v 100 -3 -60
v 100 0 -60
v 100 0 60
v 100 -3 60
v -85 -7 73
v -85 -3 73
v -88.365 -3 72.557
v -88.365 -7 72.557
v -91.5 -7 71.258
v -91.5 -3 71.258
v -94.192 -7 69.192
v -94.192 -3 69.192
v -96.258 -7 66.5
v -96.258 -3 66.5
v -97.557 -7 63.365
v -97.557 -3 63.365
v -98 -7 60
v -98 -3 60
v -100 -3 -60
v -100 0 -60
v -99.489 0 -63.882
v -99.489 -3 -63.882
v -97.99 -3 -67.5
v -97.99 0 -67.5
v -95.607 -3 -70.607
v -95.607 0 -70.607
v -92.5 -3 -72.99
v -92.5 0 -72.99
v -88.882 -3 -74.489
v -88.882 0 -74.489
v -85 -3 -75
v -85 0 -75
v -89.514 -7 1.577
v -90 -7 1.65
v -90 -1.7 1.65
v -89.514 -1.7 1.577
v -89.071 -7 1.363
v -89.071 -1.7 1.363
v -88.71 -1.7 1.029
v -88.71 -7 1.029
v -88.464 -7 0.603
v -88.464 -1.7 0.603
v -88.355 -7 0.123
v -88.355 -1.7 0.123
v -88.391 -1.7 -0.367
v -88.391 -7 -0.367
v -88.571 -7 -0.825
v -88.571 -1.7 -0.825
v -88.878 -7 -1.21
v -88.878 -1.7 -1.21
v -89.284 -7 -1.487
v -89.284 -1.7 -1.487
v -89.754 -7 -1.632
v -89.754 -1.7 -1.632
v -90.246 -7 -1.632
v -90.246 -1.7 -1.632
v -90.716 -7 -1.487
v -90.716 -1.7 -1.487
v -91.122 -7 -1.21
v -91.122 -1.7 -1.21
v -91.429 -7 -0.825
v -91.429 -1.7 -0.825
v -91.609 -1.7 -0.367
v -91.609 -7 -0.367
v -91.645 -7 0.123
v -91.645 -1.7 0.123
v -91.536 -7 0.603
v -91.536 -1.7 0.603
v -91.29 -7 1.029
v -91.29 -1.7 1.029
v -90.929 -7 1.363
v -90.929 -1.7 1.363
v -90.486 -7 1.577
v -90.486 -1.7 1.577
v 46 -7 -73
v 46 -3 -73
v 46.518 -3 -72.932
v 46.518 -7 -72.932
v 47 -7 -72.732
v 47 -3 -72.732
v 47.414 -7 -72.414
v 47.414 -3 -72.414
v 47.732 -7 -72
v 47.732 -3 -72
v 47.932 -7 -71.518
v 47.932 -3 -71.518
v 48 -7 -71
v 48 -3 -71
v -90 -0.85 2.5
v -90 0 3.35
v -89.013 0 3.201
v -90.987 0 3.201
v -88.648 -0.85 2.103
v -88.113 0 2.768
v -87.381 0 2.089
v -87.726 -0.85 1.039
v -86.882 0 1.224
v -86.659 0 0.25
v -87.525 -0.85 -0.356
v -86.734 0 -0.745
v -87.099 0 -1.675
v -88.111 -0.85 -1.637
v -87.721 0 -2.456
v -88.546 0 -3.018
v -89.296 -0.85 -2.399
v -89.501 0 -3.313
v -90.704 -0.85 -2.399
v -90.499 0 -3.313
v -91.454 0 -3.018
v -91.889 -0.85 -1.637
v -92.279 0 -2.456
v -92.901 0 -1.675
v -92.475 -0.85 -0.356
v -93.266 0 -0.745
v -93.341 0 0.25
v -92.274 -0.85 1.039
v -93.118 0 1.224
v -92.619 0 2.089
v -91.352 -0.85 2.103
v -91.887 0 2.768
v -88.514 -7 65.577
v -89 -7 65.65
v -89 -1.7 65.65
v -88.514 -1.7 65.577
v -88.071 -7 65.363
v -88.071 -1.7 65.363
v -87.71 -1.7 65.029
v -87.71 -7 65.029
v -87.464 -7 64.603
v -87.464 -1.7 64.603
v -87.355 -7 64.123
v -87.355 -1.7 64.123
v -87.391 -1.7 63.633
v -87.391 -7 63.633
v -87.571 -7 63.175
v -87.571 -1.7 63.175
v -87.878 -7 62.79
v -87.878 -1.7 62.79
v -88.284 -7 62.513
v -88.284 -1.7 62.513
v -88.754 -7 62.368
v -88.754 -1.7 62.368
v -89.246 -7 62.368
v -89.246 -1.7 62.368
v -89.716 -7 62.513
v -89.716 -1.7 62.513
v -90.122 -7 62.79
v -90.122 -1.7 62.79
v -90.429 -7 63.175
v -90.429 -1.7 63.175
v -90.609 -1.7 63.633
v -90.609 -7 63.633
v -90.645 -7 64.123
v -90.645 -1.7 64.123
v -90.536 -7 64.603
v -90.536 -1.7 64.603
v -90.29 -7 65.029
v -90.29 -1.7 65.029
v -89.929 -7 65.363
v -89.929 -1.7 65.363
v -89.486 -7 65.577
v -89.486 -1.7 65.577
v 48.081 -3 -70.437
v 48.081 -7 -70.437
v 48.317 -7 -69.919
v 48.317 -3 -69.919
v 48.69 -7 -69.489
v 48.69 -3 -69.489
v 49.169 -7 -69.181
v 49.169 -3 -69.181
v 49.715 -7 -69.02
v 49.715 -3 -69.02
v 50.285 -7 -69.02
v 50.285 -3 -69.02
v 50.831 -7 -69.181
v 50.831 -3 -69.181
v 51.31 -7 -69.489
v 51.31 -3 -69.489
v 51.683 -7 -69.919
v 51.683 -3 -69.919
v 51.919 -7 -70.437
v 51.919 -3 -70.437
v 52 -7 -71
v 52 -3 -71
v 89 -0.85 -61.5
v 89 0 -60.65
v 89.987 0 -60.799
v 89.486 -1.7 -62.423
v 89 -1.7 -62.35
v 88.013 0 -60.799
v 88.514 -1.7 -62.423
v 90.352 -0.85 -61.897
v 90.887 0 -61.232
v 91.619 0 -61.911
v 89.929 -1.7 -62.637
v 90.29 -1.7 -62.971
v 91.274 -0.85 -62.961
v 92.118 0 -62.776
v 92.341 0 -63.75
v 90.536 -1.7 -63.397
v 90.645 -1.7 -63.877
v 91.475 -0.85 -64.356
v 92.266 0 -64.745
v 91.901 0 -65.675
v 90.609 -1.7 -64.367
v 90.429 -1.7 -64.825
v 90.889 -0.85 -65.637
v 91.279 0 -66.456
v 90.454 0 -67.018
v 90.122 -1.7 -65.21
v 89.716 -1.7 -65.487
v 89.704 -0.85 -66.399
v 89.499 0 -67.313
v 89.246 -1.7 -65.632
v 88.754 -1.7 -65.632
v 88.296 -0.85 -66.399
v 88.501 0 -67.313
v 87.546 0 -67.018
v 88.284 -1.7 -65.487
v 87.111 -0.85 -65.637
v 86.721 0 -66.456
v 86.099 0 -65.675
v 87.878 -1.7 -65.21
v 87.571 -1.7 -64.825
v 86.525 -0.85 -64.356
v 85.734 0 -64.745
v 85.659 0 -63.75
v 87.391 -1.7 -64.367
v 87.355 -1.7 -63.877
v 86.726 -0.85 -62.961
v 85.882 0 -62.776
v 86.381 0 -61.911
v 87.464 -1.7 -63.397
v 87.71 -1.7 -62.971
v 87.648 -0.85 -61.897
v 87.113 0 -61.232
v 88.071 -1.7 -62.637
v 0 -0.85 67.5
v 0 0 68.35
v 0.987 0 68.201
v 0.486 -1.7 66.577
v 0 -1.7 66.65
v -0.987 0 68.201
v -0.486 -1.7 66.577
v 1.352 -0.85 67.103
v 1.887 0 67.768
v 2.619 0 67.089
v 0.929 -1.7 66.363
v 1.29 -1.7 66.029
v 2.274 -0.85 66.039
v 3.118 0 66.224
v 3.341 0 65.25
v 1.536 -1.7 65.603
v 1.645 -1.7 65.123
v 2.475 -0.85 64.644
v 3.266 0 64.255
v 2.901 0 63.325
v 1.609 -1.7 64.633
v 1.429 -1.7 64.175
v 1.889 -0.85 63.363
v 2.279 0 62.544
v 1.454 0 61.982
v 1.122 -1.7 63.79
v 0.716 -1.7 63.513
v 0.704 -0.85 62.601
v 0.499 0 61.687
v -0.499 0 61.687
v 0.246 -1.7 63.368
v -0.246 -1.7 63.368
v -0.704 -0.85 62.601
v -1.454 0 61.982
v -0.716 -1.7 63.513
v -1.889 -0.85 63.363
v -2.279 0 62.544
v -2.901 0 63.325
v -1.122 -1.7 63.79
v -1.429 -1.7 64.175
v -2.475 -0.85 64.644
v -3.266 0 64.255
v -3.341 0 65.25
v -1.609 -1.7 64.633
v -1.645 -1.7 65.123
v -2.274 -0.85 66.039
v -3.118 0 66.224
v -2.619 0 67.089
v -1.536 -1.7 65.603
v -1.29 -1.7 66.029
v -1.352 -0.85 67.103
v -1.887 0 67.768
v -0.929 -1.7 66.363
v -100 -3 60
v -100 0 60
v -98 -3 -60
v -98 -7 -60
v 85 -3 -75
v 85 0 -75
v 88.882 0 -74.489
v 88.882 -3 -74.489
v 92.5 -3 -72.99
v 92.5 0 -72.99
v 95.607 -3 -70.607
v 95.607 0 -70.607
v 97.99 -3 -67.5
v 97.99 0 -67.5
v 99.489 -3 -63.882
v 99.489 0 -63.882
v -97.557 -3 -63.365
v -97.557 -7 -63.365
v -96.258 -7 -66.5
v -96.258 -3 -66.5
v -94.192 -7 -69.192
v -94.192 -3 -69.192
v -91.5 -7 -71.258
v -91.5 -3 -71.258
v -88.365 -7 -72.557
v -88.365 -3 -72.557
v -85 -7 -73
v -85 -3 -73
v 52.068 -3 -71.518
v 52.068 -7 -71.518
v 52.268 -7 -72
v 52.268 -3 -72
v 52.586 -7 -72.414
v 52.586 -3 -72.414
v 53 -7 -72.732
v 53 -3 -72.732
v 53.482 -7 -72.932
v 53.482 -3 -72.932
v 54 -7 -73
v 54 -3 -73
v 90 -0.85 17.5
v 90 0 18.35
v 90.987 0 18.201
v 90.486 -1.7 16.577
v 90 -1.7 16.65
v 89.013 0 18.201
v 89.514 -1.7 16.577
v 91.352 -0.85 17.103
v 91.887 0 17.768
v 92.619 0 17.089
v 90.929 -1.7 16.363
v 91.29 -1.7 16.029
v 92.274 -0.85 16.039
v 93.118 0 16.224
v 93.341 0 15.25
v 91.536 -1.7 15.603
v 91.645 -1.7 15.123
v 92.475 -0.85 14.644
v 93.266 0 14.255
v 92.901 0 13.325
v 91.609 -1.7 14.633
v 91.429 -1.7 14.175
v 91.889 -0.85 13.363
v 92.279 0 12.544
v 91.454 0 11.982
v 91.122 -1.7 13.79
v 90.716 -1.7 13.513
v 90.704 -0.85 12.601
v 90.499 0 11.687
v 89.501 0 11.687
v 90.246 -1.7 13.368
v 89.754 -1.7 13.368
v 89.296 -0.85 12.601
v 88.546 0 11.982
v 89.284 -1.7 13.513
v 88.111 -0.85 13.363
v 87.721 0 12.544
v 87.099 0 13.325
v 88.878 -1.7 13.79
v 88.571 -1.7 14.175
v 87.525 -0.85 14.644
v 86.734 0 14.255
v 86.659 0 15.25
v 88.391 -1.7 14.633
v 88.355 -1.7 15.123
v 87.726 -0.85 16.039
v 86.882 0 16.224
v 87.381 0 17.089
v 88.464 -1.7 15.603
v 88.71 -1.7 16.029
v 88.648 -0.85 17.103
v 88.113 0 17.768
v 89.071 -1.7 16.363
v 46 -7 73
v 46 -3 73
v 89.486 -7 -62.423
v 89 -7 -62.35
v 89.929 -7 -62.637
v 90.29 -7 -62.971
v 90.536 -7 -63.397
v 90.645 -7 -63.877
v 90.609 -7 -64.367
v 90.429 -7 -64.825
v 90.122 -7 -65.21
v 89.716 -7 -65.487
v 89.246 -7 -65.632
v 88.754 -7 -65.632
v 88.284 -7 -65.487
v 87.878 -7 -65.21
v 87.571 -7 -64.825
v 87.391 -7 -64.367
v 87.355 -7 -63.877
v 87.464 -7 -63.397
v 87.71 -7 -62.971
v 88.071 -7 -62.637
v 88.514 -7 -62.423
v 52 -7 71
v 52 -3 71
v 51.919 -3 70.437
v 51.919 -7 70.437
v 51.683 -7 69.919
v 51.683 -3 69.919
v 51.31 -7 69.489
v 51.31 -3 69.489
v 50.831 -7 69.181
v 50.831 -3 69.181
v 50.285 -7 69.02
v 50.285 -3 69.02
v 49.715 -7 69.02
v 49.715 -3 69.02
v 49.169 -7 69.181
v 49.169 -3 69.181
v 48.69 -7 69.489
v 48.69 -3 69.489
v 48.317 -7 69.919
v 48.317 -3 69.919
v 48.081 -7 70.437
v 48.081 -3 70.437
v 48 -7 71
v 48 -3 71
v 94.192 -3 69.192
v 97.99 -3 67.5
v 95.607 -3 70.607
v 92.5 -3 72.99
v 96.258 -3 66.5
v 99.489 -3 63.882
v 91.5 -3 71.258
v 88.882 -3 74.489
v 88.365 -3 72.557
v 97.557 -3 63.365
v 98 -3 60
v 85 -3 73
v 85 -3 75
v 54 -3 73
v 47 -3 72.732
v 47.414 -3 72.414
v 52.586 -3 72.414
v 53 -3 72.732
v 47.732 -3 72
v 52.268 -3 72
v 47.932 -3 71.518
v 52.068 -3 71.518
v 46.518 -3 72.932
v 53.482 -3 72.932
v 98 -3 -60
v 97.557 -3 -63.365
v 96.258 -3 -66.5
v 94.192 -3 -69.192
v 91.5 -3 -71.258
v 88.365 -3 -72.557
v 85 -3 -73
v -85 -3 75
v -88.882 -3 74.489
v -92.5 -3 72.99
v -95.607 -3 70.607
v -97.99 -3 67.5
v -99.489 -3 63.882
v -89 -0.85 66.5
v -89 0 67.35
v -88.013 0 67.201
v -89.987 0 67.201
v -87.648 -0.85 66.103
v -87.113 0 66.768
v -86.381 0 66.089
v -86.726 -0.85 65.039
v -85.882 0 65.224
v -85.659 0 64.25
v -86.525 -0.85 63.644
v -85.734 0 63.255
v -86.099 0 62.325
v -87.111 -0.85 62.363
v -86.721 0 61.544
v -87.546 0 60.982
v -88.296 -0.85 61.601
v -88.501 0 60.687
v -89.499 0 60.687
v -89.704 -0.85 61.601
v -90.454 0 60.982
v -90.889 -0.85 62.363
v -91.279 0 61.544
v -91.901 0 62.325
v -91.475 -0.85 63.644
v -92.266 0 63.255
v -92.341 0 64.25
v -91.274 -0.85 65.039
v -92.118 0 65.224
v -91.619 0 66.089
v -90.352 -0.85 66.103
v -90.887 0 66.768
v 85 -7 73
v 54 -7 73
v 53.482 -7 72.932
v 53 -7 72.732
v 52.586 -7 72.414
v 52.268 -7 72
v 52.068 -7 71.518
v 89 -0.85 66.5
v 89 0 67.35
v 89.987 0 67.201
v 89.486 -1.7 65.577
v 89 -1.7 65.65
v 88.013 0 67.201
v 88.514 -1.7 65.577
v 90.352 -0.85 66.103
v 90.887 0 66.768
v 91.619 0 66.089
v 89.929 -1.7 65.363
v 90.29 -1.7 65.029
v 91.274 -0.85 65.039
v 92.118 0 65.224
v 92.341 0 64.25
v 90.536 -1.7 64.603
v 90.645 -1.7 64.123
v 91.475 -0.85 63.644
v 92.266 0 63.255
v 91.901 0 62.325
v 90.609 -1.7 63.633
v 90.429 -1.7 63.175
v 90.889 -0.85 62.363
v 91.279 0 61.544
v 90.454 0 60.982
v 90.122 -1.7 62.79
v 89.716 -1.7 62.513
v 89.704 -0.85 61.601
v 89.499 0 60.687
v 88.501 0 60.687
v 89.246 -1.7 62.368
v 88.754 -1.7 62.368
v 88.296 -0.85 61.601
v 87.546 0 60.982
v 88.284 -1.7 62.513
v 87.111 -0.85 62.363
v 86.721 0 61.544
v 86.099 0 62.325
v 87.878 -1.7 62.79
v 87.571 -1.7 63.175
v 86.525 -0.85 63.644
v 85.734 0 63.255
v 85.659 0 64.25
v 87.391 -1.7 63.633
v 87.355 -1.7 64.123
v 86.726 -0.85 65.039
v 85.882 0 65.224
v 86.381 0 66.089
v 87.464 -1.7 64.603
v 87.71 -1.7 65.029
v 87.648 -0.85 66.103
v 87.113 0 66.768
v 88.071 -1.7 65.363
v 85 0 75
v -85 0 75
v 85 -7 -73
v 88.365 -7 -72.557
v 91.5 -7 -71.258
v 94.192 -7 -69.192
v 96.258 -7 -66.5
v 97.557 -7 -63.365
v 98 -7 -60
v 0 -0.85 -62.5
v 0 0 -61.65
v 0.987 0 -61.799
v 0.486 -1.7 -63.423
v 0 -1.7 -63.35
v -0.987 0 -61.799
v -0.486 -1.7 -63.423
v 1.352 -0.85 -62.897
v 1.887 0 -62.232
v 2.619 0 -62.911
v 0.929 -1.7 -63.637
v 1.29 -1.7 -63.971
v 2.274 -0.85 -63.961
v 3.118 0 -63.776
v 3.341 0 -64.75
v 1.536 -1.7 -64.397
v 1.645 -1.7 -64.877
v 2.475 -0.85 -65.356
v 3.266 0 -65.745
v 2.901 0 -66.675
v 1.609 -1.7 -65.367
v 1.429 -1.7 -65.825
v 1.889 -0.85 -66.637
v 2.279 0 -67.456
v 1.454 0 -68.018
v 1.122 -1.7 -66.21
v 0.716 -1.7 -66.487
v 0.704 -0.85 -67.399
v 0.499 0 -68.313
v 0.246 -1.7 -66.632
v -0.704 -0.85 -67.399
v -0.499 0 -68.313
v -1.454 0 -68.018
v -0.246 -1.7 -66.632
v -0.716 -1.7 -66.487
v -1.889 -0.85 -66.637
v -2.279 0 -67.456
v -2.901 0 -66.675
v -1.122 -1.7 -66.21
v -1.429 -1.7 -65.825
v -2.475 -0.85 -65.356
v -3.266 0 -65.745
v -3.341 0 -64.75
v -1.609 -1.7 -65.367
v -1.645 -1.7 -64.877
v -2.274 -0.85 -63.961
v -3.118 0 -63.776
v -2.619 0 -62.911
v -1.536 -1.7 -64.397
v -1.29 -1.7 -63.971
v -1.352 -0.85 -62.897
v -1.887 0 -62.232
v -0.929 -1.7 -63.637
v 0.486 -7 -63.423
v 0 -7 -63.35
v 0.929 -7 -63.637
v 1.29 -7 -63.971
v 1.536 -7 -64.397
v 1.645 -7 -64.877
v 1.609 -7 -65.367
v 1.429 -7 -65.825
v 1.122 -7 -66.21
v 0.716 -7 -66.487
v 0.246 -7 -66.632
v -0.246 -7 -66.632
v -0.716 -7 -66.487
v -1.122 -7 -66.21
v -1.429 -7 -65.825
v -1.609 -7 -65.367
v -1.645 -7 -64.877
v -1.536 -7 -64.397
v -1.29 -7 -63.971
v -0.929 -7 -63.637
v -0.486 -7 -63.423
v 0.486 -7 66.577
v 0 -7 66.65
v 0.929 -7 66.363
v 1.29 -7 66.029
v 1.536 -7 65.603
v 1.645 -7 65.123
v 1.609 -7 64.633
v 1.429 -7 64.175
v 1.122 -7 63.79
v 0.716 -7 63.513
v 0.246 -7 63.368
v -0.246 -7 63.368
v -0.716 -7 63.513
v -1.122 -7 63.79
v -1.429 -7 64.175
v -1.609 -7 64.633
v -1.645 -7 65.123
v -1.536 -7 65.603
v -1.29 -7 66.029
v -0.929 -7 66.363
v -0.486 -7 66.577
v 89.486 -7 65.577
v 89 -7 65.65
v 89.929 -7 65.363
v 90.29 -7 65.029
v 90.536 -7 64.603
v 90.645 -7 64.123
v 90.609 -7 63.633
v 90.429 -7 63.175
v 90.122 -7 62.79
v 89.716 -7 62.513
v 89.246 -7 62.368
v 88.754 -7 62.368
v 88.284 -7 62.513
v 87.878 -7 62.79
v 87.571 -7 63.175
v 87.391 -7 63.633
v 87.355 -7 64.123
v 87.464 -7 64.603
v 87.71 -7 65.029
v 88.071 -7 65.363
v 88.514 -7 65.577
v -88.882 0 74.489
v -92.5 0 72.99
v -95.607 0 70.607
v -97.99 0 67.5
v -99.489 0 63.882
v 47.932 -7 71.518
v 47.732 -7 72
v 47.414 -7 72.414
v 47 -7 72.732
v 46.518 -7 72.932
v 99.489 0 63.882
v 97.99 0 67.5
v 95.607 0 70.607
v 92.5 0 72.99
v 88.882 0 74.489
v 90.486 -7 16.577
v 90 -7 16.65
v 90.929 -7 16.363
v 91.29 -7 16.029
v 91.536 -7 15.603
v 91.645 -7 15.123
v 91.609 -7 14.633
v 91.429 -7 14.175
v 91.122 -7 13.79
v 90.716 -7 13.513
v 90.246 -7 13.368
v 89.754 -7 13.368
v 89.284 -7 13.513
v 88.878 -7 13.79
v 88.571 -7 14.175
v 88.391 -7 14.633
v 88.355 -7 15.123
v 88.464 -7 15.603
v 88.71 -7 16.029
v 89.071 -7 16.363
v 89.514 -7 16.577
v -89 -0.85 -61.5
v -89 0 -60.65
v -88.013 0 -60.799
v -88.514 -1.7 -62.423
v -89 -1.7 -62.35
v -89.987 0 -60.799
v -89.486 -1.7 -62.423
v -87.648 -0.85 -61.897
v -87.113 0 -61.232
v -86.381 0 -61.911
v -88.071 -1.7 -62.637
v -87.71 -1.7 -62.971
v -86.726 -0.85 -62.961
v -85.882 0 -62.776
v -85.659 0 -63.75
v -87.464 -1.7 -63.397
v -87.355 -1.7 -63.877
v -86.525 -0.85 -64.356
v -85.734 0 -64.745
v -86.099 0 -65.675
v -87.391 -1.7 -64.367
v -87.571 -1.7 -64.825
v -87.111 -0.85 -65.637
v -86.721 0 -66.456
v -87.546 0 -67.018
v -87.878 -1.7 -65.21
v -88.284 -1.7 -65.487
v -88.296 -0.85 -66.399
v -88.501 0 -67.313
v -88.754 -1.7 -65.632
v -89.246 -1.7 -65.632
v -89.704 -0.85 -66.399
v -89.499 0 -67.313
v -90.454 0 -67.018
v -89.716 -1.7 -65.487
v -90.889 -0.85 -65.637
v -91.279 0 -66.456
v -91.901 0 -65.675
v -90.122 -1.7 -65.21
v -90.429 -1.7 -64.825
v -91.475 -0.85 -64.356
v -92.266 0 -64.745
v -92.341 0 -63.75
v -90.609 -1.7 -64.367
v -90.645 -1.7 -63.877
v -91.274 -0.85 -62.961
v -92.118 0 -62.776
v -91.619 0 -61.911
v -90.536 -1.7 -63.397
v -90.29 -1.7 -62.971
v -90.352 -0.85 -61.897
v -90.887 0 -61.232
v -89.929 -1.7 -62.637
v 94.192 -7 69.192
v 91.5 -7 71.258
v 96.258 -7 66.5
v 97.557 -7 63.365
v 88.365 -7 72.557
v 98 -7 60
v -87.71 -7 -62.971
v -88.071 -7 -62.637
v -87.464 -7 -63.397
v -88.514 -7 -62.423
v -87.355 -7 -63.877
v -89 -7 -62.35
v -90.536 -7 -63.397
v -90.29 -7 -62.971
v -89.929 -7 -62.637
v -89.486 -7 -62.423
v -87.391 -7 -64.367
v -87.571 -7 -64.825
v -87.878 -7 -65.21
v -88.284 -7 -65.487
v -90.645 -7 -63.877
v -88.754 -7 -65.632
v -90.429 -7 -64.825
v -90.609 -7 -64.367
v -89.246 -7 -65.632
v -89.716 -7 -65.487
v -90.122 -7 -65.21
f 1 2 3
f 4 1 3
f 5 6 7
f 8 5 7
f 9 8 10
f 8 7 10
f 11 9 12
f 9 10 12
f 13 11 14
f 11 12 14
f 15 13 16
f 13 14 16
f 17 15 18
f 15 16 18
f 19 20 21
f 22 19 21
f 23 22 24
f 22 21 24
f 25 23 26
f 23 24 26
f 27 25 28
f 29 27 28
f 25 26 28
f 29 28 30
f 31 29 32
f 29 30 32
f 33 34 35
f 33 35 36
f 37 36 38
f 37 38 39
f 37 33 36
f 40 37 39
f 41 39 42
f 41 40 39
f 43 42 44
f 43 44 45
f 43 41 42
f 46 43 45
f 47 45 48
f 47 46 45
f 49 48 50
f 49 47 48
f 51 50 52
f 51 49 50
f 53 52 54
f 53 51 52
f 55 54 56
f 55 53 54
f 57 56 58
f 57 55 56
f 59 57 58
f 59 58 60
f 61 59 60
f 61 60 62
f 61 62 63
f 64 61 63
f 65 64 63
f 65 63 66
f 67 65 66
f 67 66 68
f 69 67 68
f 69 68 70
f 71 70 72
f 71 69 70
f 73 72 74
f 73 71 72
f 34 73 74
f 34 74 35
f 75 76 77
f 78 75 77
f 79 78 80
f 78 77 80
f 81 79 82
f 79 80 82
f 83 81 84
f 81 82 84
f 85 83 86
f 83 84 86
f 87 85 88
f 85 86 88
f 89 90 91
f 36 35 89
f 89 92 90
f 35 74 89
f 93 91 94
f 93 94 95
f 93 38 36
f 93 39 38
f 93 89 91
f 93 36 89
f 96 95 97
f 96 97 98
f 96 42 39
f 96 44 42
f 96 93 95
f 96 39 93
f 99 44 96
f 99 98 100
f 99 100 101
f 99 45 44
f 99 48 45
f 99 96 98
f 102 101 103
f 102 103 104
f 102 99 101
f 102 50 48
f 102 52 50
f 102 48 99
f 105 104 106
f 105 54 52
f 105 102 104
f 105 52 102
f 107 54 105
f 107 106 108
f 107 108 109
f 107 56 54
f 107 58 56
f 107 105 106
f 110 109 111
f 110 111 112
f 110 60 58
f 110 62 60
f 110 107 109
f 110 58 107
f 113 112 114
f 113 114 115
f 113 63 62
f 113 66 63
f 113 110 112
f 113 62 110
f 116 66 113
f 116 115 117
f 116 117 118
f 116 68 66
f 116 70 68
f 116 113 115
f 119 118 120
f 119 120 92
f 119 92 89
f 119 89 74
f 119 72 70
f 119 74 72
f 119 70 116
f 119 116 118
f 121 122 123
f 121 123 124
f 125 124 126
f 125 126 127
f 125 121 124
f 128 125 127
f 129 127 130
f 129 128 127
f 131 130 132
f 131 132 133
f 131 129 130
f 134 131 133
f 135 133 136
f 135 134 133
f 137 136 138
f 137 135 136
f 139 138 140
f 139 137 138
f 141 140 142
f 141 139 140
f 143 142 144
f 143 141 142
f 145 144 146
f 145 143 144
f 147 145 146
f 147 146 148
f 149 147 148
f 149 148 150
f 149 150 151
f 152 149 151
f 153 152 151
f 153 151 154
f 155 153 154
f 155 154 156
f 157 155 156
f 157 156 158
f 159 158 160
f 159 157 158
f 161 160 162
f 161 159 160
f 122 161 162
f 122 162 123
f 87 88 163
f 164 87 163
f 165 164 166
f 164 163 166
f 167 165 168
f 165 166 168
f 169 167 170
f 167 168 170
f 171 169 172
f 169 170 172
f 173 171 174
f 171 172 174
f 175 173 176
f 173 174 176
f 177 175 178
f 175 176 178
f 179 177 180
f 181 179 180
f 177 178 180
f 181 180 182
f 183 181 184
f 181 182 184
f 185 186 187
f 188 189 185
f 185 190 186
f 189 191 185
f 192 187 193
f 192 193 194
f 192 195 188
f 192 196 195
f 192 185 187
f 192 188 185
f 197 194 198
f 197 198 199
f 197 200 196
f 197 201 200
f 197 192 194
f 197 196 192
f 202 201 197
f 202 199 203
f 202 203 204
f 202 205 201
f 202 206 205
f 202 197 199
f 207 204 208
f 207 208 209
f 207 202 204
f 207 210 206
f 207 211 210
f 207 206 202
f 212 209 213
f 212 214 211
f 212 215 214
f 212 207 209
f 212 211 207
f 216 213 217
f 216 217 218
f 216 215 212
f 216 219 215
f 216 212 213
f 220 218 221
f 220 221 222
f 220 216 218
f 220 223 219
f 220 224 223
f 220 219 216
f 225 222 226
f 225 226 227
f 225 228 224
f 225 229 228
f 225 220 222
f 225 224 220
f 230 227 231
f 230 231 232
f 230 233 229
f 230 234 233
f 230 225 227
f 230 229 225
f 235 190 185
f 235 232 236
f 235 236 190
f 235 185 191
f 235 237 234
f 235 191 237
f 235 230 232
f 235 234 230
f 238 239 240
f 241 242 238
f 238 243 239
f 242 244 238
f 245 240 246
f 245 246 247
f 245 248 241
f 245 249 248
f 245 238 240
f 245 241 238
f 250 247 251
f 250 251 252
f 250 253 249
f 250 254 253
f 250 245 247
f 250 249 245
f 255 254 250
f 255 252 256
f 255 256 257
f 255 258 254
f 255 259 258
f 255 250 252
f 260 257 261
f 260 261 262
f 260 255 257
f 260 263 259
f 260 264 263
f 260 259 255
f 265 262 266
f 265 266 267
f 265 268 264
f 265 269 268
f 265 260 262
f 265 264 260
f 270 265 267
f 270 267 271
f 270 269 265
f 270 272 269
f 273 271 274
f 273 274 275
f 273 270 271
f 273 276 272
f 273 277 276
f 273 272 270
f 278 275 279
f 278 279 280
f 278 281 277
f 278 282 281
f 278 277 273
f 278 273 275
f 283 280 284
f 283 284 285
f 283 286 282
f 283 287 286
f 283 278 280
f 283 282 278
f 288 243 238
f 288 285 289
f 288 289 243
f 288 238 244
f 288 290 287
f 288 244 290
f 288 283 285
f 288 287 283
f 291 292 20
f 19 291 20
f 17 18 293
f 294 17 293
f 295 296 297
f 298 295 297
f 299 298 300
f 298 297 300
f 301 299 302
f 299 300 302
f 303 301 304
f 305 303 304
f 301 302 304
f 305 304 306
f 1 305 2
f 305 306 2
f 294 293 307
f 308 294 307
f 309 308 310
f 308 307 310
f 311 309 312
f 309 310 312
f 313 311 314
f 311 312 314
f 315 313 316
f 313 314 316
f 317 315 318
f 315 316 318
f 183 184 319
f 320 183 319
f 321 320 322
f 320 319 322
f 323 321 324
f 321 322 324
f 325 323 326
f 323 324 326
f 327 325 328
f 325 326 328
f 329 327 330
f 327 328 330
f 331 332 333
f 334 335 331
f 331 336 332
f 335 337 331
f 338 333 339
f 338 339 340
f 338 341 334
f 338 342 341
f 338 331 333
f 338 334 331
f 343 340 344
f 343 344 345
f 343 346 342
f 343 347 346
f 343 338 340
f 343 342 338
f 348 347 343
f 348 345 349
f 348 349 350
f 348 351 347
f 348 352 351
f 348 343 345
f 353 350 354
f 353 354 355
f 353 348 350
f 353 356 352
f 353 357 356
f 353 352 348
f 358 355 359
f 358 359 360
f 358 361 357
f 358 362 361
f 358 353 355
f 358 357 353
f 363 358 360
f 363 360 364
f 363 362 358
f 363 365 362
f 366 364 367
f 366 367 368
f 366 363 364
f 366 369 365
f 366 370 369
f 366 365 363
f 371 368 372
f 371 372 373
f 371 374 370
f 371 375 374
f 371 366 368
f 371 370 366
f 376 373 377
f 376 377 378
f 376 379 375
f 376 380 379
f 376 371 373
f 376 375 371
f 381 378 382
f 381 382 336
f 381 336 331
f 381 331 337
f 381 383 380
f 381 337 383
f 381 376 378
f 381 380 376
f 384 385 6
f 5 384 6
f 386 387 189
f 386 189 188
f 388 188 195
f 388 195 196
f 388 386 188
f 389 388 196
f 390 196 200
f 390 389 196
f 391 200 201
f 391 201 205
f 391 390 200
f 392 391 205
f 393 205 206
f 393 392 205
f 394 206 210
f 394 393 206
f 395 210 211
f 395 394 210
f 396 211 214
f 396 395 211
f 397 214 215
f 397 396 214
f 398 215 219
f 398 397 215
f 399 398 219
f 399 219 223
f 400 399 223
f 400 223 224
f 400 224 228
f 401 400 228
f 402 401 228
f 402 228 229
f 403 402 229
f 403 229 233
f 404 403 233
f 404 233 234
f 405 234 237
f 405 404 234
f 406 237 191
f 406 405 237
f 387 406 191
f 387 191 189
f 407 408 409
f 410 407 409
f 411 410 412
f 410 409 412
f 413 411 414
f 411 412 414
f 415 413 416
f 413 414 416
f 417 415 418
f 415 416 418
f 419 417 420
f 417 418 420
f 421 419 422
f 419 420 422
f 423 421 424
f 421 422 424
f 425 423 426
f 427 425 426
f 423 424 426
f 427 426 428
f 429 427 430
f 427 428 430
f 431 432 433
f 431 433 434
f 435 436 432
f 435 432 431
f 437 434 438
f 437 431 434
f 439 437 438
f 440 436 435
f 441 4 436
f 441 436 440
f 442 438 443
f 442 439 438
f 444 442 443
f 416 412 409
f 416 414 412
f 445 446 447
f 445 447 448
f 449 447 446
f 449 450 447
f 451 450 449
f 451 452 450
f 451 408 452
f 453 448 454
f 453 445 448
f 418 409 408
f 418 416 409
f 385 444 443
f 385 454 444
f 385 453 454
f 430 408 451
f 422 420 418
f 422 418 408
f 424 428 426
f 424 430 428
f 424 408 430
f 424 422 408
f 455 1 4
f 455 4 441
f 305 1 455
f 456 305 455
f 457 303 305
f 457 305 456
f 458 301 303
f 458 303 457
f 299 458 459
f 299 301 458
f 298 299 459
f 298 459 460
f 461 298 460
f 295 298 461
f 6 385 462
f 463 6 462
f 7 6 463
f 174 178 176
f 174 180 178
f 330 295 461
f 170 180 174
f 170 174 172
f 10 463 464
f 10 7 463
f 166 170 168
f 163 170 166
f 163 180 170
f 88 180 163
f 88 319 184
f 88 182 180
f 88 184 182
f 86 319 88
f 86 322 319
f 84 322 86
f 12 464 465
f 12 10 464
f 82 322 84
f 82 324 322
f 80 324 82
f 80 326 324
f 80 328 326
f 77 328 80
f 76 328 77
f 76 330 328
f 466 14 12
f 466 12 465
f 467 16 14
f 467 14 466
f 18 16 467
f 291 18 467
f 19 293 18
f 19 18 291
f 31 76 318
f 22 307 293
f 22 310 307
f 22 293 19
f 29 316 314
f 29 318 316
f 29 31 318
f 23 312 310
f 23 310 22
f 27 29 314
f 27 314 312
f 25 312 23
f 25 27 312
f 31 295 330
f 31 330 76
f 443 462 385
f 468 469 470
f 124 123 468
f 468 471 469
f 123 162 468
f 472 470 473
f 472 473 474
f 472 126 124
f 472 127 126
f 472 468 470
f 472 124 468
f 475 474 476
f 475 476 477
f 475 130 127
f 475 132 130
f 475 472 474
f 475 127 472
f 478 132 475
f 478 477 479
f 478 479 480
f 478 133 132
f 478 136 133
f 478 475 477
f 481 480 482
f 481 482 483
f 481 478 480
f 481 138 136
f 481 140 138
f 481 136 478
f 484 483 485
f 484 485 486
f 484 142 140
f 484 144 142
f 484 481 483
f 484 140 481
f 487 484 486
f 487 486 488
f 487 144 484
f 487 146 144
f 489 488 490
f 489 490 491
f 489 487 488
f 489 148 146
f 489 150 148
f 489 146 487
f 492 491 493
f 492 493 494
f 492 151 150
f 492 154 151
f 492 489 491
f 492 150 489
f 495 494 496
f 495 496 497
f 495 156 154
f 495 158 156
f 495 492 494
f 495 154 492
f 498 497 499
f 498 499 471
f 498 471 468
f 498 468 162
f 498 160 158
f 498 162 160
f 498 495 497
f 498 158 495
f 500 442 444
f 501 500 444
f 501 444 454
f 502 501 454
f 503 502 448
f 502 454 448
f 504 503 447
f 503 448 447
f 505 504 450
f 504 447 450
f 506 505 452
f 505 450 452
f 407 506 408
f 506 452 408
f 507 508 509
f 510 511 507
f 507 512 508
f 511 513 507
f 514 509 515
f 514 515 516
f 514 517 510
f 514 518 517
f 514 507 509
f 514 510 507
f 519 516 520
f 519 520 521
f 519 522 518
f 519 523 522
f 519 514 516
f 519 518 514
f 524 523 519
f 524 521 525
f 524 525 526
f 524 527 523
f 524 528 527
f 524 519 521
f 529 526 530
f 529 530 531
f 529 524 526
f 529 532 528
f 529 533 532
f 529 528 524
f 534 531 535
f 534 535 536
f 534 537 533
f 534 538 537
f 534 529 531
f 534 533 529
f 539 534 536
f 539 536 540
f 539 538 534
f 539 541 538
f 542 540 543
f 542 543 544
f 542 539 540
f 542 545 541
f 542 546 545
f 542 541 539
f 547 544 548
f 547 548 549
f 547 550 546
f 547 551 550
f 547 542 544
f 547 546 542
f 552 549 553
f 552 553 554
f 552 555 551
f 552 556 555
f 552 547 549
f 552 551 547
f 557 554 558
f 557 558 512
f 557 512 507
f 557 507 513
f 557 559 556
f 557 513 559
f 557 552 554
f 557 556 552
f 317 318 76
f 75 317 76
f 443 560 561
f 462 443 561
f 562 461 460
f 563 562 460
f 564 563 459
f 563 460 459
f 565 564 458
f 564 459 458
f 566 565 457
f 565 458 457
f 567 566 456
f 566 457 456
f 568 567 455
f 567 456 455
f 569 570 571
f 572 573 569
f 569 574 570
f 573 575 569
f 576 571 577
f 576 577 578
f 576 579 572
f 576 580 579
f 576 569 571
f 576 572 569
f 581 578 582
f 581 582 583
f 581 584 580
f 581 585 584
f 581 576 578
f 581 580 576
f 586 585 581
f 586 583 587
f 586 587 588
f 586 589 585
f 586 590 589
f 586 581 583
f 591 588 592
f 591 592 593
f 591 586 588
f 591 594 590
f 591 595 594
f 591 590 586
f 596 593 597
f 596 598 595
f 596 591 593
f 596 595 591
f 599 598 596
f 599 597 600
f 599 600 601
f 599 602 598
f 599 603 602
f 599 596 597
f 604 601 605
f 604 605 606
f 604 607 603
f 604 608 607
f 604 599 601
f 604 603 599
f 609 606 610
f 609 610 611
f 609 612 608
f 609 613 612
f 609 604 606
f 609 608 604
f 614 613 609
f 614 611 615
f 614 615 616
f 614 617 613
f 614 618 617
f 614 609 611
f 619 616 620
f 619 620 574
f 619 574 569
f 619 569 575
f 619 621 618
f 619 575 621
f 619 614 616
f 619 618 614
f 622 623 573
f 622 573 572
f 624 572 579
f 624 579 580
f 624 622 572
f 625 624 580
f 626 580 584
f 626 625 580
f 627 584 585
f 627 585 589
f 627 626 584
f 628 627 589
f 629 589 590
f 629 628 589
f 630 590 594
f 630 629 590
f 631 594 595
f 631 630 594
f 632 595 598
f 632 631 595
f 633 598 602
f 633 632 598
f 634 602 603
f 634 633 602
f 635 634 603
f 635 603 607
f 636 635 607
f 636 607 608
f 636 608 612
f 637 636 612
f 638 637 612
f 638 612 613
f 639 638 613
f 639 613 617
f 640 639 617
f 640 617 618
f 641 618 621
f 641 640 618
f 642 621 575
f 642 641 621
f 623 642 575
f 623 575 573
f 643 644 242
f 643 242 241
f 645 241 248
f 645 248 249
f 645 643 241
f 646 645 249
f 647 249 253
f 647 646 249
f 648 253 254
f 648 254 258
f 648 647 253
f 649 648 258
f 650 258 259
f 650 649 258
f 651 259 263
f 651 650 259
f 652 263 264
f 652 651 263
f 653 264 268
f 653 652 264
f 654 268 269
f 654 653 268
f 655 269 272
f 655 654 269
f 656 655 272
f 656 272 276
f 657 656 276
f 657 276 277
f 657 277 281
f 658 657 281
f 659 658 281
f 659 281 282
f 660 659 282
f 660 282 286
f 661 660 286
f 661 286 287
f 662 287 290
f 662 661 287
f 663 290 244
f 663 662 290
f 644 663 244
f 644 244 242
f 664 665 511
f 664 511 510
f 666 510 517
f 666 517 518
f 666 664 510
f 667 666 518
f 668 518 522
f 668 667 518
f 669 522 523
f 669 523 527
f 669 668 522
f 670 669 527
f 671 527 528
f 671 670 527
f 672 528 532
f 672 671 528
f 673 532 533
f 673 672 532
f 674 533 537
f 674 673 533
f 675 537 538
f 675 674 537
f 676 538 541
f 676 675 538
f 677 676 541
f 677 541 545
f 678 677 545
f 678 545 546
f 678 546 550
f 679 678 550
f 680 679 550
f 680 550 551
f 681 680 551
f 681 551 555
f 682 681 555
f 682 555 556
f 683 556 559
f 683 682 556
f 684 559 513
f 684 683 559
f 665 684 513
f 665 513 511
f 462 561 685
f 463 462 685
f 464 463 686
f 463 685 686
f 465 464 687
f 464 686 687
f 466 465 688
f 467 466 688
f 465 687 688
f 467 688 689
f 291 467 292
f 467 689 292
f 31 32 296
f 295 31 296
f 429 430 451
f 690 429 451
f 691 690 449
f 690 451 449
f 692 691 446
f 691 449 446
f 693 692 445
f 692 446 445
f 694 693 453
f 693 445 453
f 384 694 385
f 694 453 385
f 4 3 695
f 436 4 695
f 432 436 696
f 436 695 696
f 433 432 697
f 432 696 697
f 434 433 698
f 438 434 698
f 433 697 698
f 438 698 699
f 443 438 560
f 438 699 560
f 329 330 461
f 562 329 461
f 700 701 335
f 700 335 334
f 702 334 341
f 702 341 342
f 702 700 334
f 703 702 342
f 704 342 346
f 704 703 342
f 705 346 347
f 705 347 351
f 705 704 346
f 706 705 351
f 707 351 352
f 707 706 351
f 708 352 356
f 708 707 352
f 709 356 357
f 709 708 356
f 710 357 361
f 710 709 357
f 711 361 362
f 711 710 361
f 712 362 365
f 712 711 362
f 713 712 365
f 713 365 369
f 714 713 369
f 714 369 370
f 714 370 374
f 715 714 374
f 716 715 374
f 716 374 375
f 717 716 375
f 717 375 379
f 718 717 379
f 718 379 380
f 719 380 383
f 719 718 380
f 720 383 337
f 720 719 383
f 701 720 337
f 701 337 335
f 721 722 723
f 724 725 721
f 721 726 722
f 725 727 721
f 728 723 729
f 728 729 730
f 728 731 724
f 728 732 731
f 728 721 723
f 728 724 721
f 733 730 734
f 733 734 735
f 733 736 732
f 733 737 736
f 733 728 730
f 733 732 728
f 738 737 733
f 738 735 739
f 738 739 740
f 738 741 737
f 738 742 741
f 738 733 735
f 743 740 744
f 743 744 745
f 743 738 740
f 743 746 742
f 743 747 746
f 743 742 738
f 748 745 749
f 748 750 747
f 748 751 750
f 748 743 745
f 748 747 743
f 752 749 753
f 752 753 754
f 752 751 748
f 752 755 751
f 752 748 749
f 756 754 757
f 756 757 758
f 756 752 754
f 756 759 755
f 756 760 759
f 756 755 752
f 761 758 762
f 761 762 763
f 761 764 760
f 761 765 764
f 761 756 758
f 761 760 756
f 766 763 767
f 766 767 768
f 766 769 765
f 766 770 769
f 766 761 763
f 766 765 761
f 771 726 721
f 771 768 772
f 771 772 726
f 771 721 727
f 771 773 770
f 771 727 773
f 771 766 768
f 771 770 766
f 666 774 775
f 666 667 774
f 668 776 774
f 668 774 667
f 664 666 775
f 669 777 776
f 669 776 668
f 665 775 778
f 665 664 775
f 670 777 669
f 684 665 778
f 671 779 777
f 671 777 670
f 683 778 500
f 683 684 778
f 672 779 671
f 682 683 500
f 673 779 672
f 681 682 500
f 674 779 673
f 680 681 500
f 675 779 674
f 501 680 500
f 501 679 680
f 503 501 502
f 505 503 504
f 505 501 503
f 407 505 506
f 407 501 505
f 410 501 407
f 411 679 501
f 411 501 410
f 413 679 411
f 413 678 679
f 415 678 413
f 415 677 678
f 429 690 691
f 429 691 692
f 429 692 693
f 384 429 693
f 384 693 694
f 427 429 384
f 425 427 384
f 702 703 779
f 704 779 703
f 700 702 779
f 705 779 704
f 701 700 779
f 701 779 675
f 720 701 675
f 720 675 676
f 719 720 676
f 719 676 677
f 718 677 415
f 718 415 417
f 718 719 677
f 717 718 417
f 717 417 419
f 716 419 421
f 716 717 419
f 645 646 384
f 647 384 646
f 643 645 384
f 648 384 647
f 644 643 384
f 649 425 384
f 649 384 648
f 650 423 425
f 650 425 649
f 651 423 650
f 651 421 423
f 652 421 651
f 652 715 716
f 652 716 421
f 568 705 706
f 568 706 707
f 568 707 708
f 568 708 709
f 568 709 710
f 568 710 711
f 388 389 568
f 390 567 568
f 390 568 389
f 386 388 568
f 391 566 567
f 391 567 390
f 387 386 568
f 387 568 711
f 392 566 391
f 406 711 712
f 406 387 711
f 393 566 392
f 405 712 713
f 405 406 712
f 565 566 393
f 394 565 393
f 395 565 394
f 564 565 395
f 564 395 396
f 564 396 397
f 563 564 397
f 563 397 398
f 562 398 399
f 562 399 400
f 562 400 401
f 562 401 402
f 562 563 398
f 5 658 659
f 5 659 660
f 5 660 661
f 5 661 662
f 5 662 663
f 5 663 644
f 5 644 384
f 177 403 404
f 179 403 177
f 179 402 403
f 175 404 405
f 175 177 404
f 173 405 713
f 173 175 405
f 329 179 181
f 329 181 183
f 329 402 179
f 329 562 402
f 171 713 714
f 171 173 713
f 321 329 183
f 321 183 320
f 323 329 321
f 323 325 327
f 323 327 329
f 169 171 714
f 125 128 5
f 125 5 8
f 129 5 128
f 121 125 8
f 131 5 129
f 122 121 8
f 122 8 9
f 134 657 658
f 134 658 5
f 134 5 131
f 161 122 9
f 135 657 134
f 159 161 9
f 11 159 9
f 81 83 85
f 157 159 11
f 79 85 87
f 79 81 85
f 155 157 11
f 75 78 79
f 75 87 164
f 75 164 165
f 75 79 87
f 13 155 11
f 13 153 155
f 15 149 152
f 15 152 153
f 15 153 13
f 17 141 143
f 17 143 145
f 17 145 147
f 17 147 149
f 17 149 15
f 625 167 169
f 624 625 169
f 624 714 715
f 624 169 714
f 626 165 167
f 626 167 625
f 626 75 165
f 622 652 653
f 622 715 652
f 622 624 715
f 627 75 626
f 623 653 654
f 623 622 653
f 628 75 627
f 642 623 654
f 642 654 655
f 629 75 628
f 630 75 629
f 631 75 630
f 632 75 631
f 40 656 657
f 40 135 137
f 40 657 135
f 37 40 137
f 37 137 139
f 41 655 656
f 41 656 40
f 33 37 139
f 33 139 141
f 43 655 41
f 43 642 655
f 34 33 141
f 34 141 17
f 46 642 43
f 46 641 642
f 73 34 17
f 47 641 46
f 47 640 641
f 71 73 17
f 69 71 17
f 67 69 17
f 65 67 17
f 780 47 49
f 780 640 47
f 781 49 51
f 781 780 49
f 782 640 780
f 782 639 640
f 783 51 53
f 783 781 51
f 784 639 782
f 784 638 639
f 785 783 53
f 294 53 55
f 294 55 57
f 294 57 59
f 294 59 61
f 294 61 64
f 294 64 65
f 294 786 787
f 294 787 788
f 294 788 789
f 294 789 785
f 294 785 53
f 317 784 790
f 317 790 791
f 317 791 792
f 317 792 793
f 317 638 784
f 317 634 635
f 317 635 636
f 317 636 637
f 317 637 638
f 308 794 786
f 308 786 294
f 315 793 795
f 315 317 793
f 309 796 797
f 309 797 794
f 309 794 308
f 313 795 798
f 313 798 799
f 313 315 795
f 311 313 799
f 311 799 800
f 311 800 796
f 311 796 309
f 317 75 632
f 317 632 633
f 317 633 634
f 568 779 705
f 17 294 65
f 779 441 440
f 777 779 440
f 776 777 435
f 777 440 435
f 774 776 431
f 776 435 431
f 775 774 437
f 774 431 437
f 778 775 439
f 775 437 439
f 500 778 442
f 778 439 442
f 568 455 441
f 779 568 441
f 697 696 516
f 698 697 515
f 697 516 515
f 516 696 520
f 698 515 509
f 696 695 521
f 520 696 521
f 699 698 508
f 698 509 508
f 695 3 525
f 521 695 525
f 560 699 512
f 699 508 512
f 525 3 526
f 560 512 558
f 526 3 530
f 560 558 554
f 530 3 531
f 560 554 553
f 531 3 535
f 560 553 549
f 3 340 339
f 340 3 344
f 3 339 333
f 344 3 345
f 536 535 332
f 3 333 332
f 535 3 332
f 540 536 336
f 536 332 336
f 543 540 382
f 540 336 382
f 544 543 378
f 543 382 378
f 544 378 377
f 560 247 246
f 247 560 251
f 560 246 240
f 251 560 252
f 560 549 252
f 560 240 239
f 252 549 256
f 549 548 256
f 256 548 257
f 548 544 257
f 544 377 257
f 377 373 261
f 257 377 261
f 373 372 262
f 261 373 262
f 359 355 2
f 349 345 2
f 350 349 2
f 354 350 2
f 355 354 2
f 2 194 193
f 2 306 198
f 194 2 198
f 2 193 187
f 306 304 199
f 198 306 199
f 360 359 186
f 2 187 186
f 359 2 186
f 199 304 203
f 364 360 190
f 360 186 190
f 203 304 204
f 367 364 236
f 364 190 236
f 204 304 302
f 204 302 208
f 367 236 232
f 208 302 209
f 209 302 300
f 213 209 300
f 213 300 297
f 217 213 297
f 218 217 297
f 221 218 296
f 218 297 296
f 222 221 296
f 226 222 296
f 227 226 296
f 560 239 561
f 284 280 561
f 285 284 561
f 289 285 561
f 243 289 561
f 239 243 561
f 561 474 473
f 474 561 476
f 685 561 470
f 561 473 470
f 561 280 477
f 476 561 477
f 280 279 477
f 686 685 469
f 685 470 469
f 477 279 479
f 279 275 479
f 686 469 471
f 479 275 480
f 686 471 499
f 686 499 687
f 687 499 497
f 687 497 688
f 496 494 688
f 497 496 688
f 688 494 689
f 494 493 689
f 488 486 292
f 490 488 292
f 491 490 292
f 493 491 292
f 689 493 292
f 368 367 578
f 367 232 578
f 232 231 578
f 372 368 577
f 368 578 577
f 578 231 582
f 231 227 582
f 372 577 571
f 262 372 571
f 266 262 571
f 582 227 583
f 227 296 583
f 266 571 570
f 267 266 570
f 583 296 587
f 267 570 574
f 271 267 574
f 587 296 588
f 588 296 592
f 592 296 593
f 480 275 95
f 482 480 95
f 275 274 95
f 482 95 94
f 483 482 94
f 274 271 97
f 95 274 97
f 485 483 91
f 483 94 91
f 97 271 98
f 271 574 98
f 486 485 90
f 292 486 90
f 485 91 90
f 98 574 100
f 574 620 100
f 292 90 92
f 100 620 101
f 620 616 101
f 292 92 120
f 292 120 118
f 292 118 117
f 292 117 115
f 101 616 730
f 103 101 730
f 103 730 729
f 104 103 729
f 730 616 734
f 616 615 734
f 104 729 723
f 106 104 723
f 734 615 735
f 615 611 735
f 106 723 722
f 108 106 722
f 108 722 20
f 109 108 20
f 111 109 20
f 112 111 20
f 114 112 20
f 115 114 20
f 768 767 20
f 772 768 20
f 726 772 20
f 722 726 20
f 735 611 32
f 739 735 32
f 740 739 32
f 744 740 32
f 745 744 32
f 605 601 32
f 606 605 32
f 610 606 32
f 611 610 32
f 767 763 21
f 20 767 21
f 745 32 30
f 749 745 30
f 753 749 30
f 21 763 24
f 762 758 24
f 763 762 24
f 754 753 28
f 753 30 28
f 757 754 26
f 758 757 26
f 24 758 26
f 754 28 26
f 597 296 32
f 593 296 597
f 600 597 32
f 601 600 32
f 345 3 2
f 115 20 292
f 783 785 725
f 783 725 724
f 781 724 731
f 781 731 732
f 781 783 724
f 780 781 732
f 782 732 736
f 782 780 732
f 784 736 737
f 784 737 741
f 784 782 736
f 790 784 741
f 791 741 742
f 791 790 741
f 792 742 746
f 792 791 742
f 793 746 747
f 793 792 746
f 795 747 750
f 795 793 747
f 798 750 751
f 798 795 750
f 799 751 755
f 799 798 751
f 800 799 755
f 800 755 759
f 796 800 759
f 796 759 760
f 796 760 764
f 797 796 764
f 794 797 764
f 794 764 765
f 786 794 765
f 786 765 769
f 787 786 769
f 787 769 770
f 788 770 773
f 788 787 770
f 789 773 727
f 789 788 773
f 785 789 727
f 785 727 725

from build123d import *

# Parameters (mm, degrees)
BASE_PLATE_DEPTH         = 3
INNER_START              = -3
INNER_BASE_PROFILE_DEPTH = 4
MOUNTING_START           = -7
BASEPLATE_5_R            = 1.65
MOUNTING_HOLES_DEPTH     = 7
COUNTERSINK_SIZE         = 1.7


with BuildPart() as part:
    # BasePlate → Base Plate (new body)
    with BuildSketch(Plane(origin=(0, 0, 0), x_dir=(1, 0, 0), z_dir=(0, 1, 0))):
        with BuildLine():
            Line((-85, 75), (85, 75))
            ThreePointArc((85, 75), (95.606601718, 70.606601718), (100, 60))
            Line((100, 60), (100, -60))
            ThreePointArc((100, -60), (95.606601718, -70.606601718), (85, -75))
            Line((85, -75), (-85, -75))
            ThreePointArc((-85, -75), (-95.606601718, -70.606601718), (-100, -60))
            Line((-100, -60), (-100, 60))
            ThreePointArc((-100, 60), (-95.606601718, 70.606601718), (-85, 75))
        make_face()
    extrude(amount=-BASE_PLATE_DEPTH)

    # BasePlate<4> → Inner Base Profile (add)
    with BuildSketch(Plane(origin=(0, 0, 0), x_dir=(1, 0, 0), z_dir=(0, 1, 0)).offset(INNER_START)):
        with BuildLine():
            Line((-85, 73), (46, 73))
            ThreePointArc((46, 73), (47.414213562, 72.414213562), (48, 71))
            ThreePointArc((48, 71), (50, 69), (52, 71))
            ThreePointArc((52, 71), (52.585786438, 72.414213562), (54, 73))
            Line((54, 73), (85, 73))
            ThreePointArc((85, 73), (94.192388155, 69.192388155), (98, 60))
            Line((98, 60), (98, -60))
            ThreePointArc((98, -60), (94.192388155, -69.192388155), (85, -73))
            Line((85, -73), (54, -73))
            ThreePointArc((54, -73), (52.585786438, -72.414213562), (52, -71))
            ThreePointArc((52, -71), (50, -69), (48, -71))
            ThreePointArc((48, -71), (47.414213562, -72.414213562), (46, -73))
            Line((46, -73), (-85, -73))
            ThreePointArc((-85, -73), (-94.192388155, -69.192388155), (-98, -60))
            Line((-98, -60), (-98, 60))
            ThreePointArc((-98, 60), (-94.192388155, 69.192388155), (-85, 73))
        make_face()
    extrude(amount=-INNER_BASE_PROFILE_DEPTH)

    # BasePlate<5> → Mounting Holes (cut)
    with BuildSketch(Plane(origin=(0, 0, 0), x_dir=(1, 0, 0), z_dir=(0, 1, 0)).offset(MOUNTING_START)):
        with Locations(Location((90, -15, 0), (0, 0, 270))):
            Circle(BASEPLATE_5_R)
        with Locations(Location((-89, 64, 0), (0, 0, 270))):
            Circle(BASEPLATE_5_R)
        with Locations(Location((89, 64, 0), (0, 0, 270))):
            Circle(BASEPLATE_5_R)
        with Locations(Location((89, -64, 0), (0, 0, 270))):
            Circle(BASEPLATE_5_R)
        with Locations(Location((-89, -64, 0), (0, 0, 270))):
            Circle(BASEPLATE_5_R)
        with Locations(Location((0, 65, 0), (0, 0, 270))):
            Circle(BASEPLATE_5_R)
        with Locations(Location((-90, 0, 0), (0, 0, 270))):
            Circle(BASEPLATE_5_R)
        with Locations(Location((0, -65, 0), (0, 0, 270))):
            Circle(BASEPLATE_5_R)
    extrude(amount=MOUNTING_HOLES_DEPTH, mode=Mode.SUBTRACT)

    # Countersink
    countersink_edges = [part.edges().sort_by_distance(p)[0] for p in [
        (-89, 0, 62.35),
        (0, 0, -66.65),
        (89, 0, -65.65),
        (90, 0, 13.35),
        (89, 0, 62.35),
        (-90, 0, -1.65),
        (-89, 0, -65.65),
        (0, 0, 63.35),
    ]]
    chamfer(countersink_edges, length=COUNTERSINK_SIZE)


solid = part.part
